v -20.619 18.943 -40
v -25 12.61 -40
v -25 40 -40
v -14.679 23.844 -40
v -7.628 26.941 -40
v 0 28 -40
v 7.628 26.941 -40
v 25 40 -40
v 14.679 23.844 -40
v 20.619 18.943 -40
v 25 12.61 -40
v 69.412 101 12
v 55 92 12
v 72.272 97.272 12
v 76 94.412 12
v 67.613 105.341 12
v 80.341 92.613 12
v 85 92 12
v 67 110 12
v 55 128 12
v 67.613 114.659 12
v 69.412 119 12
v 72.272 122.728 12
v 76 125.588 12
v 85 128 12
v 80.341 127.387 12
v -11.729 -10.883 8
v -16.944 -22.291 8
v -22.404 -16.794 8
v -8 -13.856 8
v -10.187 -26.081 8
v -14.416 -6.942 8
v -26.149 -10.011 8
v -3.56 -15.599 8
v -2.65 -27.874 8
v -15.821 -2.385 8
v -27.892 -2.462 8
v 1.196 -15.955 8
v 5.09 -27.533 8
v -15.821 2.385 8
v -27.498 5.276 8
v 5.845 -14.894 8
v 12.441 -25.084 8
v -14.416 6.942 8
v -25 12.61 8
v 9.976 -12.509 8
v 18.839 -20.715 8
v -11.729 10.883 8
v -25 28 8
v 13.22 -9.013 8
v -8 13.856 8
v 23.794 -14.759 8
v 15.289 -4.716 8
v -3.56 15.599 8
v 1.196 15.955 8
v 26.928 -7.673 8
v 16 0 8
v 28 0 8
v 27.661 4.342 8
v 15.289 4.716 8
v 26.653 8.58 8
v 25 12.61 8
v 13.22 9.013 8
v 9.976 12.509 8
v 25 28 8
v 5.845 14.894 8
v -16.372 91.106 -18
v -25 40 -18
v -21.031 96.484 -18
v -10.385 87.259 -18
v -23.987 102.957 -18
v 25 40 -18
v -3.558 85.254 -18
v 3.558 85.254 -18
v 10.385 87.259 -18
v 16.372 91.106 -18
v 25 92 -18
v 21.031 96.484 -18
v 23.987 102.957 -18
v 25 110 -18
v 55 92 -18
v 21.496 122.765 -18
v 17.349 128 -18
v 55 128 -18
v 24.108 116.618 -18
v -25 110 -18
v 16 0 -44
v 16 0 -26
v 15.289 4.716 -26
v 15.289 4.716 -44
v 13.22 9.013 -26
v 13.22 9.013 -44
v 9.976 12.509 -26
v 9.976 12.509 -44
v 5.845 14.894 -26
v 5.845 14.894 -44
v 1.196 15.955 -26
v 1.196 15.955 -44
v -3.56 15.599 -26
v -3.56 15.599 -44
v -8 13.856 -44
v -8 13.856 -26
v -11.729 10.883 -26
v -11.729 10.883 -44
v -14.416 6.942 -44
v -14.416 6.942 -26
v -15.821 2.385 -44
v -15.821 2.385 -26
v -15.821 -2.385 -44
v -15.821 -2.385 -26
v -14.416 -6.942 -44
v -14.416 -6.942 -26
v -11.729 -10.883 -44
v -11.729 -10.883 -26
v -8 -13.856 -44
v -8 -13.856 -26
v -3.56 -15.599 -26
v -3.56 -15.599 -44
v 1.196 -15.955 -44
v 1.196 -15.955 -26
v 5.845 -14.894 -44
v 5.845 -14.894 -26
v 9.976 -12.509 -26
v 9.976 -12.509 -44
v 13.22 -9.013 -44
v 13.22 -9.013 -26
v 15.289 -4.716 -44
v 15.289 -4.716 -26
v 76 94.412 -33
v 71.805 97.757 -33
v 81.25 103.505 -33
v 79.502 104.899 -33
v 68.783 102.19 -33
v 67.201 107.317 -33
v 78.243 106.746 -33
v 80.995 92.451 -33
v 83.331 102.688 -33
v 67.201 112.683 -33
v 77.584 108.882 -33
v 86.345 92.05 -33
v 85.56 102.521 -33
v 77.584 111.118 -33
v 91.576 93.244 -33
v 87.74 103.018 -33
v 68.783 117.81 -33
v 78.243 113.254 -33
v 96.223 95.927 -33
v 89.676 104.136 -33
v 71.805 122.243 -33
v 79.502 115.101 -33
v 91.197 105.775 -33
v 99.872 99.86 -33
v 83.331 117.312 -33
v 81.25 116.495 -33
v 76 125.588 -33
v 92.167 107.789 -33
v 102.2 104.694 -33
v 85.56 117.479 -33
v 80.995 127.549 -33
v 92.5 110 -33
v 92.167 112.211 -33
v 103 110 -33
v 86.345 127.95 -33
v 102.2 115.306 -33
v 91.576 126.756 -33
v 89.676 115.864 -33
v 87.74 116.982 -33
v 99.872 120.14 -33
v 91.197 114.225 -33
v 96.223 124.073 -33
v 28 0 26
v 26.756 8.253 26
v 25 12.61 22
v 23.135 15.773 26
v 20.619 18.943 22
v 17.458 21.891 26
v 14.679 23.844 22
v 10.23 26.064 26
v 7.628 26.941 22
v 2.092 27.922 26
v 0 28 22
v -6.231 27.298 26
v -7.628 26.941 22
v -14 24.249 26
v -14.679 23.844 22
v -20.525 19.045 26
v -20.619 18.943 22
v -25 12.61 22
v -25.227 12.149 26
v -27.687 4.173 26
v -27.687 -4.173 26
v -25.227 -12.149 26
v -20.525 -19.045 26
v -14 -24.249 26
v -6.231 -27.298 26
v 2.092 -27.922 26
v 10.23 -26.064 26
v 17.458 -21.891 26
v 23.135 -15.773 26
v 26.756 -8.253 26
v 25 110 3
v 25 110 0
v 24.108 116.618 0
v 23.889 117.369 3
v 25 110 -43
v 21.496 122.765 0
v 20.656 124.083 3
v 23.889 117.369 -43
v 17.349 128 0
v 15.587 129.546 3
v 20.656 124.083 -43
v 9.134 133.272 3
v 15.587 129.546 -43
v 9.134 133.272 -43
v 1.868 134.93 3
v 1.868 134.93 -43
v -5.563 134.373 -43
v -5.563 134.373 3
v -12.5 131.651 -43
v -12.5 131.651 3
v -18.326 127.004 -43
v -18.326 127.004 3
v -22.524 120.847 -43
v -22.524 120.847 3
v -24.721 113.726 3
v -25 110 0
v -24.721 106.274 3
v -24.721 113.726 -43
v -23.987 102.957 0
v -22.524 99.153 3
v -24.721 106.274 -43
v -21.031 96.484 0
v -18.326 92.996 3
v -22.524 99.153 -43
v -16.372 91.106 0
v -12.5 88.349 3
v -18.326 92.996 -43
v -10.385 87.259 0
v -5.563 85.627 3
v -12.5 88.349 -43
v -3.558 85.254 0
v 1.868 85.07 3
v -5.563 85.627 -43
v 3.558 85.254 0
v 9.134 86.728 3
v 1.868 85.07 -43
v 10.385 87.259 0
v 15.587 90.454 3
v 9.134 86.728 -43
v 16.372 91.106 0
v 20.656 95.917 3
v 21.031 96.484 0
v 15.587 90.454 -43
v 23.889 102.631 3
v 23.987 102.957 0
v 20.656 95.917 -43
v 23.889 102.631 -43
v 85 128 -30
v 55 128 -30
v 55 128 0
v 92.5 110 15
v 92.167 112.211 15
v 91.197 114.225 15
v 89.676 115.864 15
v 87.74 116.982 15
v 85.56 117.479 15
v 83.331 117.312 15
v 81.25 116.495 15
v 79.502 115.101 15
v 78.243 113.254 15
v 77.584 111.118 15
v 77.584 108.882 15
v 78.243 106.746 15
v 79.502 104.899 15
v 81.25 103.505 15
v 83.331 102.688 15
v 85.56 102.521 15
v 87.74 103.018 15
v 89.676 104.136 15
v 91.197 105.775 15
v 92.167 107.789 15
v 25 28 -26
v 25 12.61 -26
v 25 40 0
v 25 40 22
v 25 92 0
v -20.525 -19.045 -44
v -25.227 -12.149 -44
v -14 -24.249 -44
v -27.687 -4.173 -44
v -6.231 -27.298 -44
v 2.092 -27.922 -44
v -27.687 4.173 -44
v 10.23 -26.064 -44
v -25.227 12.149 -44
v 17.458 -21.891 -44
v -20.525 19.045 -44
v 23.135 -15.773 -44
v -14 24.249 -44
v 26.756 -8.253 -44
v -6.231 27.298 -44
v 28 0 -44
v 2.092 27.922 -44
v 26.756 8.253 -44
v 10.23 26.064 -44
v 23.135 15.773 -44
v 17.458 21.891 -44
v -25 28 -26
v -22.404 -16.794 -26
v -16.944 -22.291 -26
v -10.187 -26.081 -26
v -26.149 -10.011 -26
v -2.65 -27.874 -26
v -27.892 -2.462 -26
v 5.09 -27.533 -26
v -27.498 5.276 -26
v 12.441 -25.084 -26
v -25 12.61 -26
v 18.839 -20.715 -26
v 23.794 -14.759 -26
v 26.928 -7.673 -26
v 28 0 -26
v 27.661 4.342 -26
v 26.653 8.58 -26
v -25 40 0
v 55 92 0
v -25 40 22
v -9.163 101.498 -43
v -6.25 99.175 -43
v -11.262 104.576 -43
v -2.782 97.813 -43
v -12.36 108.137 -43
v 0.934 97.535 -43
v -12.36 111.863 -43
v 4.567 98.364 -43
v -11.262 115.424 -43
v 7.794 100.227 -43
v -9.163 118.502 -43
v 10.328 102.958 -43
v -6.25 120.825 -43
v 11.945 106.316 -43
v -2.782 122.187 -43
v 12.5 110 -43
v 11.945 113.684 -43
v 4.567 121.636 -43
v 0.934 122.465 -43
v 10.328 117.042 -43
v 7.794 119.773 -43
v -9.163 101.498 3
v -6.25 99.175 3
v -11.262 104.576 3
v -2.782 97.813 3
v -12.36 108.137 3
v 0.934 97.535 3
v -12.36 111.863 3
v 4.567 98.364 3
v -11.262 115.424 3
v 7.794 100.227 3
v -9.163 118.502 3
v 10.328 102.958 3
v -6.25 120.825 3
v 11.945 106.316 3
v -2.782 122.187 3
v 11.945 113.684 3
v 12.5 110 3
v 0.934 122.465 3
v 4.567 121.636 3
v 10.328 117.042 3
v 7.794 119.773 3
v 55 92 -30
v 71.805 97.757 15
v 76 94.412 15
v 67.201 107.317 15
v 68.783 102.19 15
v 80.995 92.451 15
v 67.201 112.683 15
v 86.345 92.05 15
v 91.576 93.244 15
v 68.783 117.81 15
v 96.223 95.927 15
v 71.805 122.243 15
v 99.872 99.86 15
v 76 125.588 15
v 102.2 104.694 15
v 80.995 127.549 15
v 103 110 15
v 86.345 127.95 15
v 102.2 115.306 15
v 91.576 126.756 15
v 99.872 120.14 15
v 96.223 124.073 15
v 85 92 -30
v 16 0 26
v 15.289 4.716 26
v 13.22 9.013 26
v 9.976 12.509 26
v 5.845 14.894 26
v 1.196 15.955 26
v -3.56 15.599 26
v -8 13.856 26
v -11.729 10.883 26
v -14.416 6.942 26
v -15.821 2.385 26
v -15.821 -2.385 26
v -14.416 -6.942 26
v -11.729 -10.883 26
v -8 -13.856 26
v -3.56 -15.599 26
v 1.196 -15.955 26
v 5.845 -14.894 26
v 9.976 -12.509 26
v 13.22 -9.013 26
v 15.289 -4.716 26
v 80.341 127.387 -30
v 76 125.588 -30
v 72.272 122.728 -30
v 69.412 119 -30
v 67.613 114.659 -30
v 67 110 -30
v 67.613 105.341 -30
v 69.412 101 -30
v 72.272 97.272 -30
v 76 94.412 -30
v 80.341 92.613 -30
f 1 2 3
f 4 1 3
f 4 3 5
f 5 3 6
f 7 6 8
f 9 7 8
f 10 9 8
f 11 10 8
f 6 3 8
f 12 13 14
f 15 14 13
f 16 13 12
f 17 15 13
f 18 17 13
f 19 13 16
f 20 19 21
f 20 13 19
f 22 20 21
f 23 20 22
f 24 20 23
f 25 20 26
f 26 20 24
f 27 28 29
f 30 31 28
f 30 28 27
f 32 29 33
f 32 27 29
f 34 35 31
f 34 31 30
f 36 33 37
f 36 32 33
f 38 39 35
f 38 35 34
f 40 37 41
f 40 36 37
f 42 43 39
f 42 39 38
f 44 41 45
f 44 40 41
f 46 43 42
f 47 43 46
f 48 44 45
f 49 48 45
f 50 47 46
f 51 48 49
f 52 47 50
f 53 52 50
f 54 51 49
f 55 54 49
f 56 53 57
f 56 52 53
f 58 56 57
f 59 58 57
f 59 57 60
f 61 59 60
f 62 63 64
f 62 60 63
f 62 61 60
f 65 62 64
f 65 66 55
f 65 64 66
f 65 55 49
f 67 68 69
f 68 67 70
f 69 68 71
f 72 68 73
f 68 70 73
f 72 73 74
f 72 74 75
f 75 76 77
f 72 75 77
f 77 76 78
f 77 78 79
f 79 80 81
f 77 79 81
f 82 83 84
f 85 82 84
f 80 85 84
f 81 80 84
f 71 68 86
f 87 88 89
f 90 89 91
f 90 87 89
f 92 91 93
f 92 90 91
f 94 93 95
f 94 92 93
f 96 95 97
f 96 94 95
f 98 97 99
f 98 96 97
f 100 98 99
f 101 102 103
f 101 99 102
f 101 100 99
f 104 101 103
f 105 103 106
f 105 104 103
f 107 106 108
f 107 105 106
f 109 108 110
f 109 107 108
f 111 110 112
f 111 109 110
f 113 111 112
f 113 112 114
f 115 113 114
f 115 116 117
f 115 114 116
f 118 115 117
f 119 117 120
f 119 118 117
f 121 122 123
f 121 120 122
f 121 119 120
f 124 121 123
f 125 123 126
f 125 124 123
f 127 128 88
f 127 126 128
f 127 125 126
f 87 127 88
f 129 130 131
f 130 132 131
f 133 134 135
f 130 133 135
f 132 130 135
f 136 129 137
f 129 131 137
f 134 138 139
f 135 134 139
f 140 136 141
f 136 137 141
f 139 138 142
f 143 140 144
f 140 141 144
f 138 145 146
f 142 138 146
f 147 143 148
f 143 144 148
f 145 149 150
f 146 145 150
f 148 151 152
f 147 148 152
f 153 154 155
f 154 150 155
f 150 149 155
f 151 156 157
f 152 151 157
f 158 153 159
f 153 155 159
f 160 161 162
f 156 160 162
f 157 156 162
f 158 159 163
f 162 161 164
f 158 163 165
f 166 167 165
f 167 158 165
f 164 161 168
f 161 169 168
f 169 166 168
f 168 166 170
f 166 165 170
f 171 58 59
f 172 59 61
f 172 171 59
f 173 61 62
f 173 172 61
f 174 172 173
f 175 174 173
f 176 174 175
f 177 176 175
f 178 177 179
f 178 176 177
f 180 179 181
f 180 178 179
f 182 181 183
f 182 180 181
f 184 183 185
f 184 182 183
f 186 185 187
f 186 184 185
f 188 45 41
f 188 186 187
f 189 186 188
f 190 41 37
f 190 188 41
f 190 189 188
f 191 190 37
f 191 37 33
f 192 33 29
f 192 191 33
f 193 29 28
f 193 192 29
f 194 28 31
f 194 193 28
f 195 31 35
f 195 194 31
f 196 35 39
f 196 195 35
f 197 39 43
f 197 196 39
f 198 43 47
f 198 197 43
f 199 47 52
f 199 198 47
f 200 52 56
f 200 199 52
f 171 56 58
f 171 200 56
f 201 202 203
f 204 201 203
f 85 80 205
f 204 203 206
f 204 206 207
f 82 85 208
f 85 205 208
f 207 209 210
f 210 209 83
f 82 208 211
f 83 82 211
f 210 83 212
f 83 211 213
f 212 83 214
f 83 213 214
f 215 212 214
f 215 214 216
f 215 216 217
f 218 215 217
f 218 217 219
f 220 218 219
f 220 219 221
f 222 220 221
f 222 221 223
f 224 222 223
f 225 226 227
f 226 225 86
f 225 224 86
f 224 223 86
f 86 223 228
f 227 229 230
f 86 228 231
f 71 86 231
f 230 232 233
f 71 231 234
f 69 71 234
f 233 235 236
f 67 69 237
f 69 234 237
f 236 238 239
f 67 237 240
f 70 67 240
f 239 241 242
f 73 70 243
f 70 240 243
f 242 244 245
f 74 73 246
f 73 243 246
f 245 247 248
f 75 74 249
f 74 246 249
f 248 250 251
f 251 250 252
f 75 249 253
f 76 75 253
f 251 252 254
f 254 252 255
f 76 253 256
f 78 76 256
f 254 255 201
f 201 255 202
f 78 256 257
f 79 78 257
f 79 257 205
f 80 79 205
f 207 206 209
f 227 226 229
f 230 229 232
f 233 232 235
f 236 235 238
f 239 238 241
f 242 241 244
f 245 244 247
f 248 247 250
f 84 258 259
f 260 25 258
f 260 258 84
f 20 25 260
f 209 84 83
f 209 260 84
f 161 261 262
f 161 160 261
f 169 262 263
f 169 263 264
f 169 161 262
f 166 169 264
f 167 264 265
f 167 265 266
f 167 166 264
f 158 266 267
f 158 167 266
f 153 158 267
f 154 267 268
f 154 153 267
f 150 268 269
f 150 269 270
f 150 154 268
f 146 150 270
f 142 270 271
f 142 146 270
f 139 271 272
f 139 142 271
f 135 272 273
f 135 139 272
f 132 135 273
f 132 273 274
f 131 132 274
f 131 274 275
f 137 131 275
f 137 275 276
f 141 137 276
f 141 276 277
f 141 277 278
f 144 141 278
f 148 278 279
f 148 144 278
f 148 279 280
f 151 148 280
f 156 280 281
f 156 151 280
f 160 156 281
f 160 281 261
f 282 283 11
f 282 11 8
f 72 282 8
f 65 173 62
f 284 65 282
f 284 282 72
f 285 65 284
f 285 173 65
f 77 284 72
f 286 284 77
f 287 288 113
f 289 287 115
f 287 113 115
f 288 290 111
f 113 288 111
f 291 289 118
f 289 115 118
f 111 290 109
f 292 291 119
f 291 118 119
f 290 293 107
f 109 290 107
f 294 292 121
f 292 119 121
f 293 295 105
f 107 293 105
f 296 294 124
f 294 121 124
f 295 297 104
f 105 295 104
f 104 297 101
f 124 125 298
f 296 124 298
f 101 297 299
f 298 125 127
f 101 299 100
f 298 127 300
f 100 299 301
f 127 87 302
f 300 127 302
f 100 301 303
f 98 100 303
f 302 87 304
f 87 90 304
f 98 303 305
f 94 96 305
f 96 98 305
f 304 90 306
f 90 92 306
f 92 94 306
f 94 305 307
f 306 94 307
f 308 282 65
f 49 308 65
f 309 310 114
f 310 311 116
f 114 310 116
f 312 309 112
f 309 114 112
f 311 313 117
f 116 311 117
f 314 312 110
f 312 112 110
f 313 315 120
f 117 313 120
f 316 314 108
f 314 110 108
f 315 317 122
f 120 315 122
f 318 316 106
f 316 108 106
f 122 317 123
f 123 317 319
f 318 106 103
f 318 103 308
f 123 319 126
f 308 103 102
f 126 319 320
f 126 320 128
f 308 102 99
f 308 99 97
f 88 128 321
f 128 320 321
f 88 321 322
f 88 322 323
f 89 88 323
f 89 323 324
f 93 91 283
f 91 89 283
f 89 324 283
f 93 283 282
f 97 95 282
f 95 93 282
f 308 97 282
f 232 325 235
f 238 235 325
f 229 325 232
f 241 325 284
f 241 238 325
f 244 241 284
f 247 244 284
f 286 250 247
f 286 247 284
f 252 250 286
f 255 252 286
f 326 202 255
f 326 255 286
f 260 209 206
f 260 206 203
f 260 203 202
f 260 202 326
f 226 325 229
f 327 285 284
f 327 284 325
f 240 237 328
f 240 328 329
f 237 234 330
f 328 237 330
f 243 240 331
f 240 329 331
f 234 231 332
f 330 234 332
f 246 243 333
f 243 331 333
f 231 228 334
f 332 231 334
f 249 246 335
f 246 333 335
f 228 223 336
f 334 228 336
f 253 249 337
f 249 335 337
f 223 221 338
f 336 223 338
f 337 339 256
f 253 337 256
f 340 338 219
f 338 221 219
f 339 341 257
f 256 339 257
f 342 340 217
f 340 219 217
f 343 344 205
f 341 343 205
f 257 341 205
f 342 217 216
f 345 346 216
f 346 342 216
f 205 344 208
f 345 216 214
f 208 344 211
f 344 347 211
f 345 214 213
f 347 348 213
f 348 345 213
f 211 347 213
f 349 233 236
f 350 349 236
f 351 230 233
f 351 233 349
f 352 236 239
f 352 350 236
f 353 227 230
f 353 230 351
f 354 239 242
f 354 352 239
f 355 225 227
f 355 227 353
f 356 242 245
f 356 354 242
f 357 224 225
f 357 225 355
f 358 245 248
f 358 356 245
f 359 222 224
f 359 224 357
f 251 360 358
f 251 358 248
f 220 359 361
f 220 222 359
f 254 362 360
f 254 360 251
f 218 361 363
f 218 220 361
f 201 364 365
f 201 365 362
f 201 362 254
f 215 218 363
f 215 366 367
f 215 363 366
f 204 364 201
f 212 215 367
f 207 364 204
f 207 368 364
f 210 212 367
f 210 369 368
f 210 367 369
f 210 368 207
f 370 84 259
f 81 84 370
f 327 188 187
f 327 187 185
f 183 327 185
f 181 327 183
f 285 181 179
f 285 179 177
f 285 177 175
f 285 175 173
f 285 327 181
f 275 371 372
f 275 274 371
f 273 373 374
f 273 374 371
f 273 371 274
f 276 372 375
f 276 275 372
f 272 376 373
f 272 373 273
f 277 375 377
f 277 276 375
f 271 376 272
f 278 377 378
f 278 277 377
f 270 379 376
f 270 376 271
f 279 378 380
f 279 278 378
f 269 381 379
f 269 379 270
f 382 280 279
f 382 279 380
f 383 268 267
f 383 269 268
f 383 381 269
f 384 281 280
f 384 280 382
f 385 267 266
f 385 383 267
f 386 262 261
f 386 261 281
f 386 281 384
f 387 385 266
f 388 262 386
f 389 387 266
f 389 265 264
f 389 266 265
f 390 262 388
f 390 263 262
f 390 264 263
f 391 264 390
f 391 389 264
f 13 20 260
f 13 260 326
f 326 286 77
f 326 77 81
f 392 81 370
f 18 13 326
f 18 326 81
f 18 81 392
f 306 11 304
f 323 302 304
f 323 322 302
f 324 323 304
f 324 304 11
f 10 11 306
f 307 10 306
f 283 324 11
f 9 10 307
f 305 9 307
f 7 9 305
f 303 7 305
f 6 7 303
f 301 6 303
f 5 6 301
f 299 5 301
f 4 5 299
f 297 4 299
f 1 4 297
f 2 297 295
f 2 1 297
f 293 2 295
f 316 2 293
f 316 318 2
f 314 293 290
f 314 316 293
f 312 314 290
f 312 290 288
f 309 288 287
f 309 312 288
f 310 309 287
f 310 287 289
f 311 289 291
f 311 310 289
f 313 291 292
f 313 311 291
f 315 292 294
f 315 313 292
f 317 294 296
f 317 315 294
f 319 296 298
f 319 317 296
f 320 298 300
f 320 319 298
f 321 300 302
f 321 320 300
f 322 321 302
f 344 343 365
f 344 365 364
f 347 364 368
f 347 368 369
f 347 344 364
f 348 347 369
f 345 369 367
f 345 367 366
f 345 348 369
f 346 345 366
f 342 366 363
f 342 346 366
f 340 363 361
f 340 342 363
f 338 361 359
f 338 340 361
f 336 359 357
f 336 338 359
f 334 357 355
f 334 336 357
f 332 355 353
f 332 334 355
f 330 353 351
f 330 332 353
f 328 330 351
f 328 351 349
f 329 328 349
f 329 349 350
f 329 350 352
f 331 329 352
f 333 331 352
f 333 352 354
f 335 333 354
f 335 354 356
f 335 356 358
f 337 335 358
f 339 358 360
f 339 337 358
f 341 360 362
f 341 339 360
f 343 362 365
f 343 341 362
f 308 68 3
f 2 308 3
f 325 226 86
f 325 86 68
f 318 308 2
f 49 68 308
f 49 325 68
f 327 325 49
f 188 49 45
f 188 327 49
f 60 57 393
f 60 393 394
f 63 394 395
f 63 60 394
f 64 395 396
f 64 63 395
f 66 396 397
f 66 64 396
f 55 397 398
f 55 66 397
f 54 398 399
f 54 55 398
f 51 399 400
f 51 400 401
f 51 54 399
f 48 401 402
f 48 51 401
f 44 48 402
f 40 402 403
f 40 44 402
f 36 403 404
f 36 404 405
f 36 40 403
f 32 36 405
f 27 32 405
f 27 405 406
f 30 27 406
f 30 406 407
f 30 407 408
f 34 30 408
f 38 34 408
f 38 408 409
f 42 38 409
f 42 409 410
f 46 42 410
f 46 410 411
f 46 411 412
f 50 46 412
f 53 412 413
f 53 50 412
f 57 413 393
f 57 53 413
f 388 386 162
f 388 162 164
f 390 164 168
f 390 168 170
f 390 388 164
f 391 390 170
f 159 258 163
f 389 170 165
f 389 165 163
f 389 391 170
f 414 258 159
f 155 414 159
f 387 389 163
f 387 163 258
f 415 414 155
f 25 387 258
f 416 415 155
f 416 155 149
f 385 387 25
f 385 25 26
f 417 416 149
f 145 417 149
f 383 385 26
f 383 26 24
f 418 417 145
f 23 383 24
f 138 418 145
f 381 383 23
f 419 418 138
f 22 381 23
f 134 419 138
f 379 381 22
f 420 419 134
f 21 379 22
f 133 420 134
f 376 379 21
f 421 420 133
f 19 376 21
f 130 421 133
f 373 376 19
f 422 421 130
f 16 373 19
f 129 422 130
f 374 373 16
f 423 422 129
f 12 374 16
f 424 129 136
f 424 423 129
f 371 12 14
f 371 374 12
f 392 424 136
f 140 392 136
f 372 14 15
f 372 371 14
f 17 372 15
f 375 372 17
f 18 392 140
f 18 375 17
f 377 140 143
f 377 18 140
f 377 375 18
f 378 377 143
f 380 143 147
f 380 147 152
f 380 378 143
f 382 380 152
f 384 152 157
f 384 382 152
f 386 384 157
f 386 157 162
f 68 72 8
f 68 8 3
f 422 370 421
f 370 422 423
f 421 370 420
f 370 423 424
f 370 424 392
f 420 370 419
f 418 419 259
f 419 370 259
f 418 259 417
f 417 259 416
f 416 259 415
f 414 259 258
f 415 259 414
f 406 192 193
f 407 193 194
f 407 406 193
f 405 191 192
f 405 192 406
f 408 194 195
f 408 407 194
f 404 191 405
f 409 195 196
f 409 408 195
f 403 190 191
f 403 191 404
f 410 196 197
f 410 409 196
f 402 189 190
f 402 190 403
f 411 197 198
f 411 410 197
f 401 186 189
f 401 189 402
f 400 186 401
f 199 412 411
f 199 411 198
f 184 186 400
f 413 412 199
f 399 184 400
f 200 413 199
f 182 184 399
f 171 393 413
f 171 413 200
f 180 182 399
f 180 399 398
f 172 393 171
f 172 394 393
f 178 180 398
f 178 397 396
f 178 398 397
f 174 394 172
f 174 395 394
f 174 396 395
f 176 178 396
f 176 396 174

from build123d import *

# Parameters (mm, degrees)
BOSS_EXTRUDE1_DEPTH      = 3
BOSS_EXTRUDE1_DEPTH_BACK = 43
SKETCH1_R                = 12.5
BOSS_EXTRUDE2_DEPTH      = 18
SKETCH2_R                = 16
BOSS_EXTRUDE3_DEPTH      = 35
BOSS_EXTRUDE4_DEPTH      = 31
CUT_EXTRUDE1_DEPTH       = 152.558569537
CUT_EXTRUDE1_DEPTH_BACK  = 152.558569537
SKETCH3_W                = 34
SKETCH3_H                = 83.380174096
SKETCH4_R                = 7.5
BOSS_EXTRUDE5_DEPTH      = 24
BOSS_EXTRUDE6_DEPTH      = 21
BOSS_EXTRUDE7_DEPTH      = 9


with BuildPart() as part:
    # Sketch1 → Boss-Extrude1 (new, two sides: drawn at the far end of the back side and taken through both)
    with BuildSketch(Plane.XY.offset(-BOSS_EXTRUDE1_DEPTH_BACK)):
        with BuildLine():
            ThreePointArc((25, 110), (0, 135), (-25, 110))
            ThreePointArc((-25, 110), (0, 85), (25, 110))
        make_face()
        with Locations((0, 110)):
            Circle(SKETCH1_R, mode=Mode.SUBTRACT)
    extrude(amount=BOSS_EXTRUDE1_DEPTH + BOSS_EXTRUDE1_DEPTH_BACK)

    # Sketch1<3> → Boss-Extrude2 (add)
    with BuildSketch(Plane.XY):
        with BuildLine():
            ThreePointArc((25, 110), (0, 85), (-25, 110))
            Line((-25, 110), (-25, 40))
            Line((-25, 40), (25, 40))
            Line((25, 40), (25, 110))
        make_face()
    extrude(amount=-BOSS_EXTRUDE2_DEPTH)



with BuildPart() as body_2:
    # Sketch2 → Boss-Extrude3 (new, symmetric)
    with BuildSketch(Plane.XY.offset(-9)):
        with BuildLine():
            ThreePointArc((25, 12.609520213), (0, 28), (-25, 12.609520213))
            ThreePointArc((-25, 12.609520213), (-6.480740698, -27.239676944), (28, 0))
            ThreePointArc((28, 0), (27.239676944, 6.480740698), (25, 12.609520213))
        make_face()
        Circle(SKETCH2_R, mode=Mode.SUBTRACT)
    extrude(amount=BOSS_EXTRUDE3_DEPTH, both=True)


with BuildPart() as part_1:
    add(part.part)

    add(body_2.part)  # Boss-Extrude4 merges body 2
    # Sketch2<3> → Boss-Extrude4 (add, symmetric)
    with BuildSketch(Plane.XY.offset(-9)):
        with BuildLine():
            Line((25, 40), (-25, 40))
            Line((-25, 40), (-25, 12.609520213))
            ThreePointArc((-25, 12.609520213), (0, 28), (25, 12.609520213))
            Line((25, 12.609520213), (25, 40))
        make_face()
    extrude(amount=BOSS_EXTRUDE4_DEPTH, both=True)

    # Sketch3 → Cut-Extrude1 (cut, two sides: drawn at the far end of the back side and taken through both)
    with BuildSketch(Plane.ZY.offset(25).offset(-CUT_EXTRUDE1_DEPTH_BACK)):
        with Locations((-9, -13.690087048)):
            Rectangle(SKETCH3_W, SKETCH3_H)
    extrude(amount=CUT_EXTRUDE1_DEPTH + CUT_EXTRUDE1_DEPTH_BACK, mode=Mode.SUBTRACT)



with BuildPart() as body_2_2:
    # Sketch4 → Boss-Extrude5 (new, symmetric)
    with BuildSketch(Plane.XY.offset(-9)):
        with BuildLine():
            ThreePointArc((103, 110), (97.727922061, 122.727922061), (85, 128))
            ThreePointArc((85, 128), (67, 110), (85, 92))
            ThreePointArc((85, 92), (97.727922061, 97.272077939), (103, 110))
        make_face()
        with Locations((85, 110)):
            Circle(SKETCH4_R, mode=Mode.SUBTRACT)
    extrude(amount=BOSS_EXTRUDE5_DEPTH, both=True)

    # Sketch4<3> → Boss-Extrude6 (add, symmetric)
    with BuildSketch(Plane.XY.offset(-9)):
        with BuildLine():
            ThreePointArc((85, 92), (67, 110), (85, 128))
            Line((85, 128), (55, 128))
            Line((55, 128), (55, 92))
            Line((55, 92), (85, 92))
        make_face()
    extrude(amount=BOSS_EXTRUDE6_DEPTH, both=True)


with BuildPart() as part_2:
    add(part_1.part)

    add(body_2_2.part)  # Boss-Extrude7 merges body 2 2
    # Sketch4<4> → Boss-Extrude7 (add, symmetric)
    with BuildSketch(Plane.XY.offset(-9)):
        with BuildLine():
            Line((55, 92), (55, 128))
            Line((55, 128), (17.349351573, 128))
            ThreePointArc((17.349351573, 128), (25, 110), (17.349351573, 92))
            Line((17.349351573, 92), (55, 92))
        make_face()
    extrude(amount=BOSS_EXTRUDE7_DEPTH, both=True)


solid = part_2.part
